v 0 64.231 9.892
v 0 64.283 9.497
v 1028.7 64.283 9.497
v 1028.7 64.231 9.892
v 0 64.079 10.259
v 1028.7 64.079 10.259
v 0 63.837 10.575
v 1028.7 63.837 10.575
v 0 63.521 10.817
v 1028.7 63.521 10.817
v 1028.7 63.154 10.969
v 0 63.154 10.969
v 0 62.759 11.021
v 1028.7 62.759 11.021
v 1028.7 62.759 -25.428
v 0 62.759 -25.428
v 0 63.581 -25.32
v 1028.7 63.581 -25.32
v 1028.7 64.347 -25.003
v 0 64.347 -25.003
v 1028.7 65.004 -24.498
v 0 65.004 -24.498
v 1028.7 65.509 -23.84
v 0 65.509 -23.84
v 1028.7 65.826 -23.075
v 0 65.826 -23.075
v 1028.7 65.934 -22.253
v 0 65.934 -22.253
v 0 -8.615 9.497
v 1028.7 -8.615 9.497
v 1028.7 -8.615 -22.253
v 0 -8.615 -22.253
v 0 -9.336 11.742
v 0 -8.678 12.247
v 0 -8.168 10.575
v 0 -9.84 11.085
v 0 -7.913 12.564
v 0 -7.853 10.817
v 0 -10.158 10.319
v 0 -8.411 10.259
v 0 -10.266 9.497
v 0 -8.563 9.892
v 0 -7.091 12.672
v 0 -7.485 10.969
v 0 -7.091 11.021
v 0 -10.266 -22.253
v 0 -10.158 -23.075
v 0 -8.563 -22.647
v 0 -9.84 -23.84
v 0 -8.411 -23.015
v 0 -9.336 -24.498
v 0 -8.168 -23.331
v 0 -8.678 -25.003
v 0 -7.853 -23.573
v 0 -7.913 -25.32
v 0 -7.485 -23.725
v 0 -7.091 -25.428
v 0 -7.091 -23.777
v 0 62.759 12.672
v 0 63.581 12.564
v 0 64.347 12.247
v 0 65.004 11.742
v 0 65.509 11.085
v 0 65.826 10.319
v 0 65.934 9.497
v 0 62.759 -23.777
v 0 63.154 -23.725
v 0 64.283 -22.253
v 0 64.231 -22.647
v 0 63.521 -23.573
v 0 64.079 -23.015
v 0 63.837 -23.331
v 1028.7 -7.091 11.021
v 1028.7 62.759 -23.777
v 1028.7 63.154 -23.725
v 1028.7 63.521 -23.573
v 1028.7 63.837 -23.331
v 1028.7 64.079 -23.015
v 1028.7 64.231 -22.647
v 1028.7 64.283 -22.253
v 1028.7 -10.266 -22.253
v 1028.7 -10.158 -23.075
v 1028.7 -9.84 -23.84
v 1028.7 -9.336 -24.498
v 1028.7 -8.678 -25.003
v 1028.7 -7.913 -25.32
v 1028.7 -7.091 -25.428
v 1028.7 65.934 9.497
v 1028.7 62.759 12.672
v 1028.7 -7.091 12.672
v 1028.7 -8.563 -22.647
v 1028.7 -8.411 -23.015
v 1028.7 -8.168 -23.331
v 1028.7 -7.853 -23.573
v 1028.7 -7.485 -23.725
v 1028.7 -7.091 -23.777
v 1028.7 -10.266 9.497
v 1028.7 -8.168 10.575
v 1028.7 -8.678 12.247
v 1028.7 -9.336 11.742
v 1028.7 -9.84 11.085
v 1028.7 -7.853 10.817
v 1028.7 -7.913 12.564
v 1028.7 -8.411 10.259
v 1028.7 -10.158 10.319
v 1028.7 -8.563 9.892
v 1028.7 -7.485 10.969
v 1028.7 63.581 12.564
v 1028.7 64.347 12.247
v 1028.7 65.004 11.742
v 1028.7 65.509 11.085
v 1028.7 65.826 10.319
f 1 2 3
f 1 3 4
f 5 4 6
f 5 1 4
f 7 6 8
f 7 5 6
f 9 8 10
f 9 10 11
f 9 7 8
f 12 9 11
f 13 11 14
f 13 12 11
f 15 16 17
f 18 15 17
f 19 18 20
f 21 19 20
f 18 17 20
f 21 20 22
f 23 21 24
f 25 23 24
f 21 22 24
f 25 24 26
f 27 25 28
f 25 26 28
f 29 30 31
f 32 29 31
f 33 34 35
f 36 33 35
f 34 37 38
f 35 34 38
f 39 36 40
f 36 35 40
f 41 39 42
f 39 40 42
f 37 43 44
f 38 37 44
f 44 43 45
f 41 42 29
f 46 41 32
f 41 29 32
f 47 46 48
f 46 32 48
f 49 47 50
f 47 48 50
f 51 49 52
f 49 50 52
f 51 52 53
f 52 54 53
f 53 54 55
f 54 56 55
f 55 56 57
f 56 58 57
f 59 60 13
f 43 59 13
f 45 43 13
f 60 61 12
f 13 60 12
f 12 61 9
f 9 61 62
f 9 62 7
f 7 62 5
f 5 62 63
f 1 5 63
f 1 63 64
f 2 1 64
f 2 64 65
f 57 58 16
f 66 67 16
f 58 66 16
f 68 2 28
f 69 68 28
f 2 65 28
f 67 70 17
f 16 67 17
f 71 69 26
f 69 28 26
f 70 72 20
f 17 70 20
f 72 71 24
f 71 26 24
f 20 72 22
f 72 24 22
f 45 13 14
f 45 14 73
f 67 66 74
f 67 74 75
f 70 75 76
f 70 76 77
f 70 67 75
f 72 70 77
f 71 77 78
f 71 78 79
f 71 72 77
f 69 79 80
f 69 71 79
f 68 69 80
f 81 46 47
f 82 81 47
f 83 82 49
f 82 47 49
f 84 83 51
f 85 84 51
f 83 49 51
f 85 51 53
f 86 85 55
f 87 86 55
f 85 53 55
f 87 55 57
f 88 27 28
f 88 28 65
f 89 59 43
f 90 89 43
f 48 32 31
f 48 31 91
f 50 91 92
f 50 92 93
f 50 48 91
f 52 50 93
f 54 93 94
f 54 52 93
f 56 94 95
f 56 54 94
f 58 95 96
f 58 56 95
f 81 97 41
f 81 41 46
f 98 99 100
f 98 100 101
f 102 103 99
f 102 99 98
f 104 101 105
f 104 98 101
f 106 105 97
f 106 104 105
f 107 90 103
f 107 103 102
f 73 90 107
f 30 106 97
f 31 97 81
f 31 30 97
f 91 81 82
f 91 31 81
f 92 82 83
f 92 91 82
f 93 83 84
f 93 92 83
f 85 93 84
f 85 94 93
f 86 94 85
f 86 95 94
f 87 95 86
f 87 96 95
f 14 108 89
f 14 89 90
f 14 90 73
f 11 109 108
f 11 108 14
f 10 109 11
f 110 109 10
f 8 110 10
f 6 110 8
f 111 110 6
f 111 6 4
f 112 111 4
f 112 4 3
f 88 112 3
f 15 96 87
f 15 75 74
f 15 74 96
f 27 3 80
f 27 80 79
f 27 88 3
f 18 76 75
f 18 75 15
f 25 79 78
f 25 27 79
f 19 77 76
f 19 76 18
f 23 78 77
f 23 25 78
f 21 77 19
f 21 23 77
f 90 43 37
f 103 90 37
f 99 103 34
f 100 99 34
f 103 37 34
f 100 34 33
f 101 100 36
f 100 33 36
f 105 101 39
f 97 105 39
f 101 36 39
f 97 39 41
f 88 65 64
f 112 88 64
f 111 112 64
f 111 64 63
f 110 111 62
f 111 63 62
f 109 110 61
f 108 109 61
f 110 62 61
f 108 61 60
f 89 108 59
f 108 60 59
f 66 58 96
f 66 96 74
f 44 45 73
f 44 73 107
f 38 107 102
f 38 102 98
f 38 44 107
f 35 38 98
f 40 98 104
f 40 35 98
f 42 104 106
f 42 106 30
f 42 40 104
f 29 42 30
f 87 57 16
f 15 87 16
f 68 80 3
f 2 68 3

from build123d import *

# Parameters (mm, degrees)
EXTRUDE_THIN2_DEPTH = 1028.7


with BuildPart() as part:
    # Sketch1 → Extrude-Thin2 (new body)
    with BuildSketch(Plane(origin=(0, 0, 0), x_dir=(0, 0, -1), z_dir=(1, 0, 0))):
        with BuildLine():
            Line((22.252869444, 65.934166667), (-9.497130556, 65.934166667))
            ThreePointArc((-9.497130556, 65.934166667), (-11.742194586, 65.004230697), (-12.672130556, 62.759166667))
            Line((-12.672130556, 62.759166667), (-12.672130556, -7.090833333))
            ThreePointArc((-12.672130556, -7.090833333), (-11.742194586, -9.335897364), (-9.497130556, -10.265833333))
            Line((-9.497130556, -10.265833333), (22.252869444, -10.265833333))
            ThreePointArc((22.252869444, -10.265833333), (24.497933475, -9.335897364), (25.427869444, -7.090833333))
            Line((25.427869444, -7.090833333), (25.427869444, 62.759166667))
            ThreePointArc((25.427869444, 62.759166667), (24.497933475, 65.004230697), (22.252869444, 65.934166667))
        make_face()
        with BuildLine():
            Line((22.252869444, 64.283166667), (-9.497130556, 64.283166667))
            ThreePointArc((-9.497130556, 64.283166667), (-10.57476129, 63.836797401), (-11.021130556, 62.759166667))
            Line((-11.021130556, 62.759166667), (-11.021130556, -7.090833333))
            ThreePointArc((-11.021130556, -7.090833333), (-10.57476129, -8.168464068), (-9.497130556, -8.614833333))
            Line((-9.497130556, -8.614833333), (22.252869444, -8.614833333))
            ThreePointArc((22.252869444, -8.614833333), (23.330500179, -8.168464068), (23.776869444, -7.090833333))
            Line((23.776869444, -7.090833333), (23.776869444, 62.759166667))
            ThreePointArc((23.776869444, 62.759166667), (23.330500179, 63.836797401), (22.252869444, 64.283166667))
        make_face(mode=Mode.SUBTRACT)
    extrude(amount=EXTRUDE_THIN2_DEPTH)


solid = part.part
